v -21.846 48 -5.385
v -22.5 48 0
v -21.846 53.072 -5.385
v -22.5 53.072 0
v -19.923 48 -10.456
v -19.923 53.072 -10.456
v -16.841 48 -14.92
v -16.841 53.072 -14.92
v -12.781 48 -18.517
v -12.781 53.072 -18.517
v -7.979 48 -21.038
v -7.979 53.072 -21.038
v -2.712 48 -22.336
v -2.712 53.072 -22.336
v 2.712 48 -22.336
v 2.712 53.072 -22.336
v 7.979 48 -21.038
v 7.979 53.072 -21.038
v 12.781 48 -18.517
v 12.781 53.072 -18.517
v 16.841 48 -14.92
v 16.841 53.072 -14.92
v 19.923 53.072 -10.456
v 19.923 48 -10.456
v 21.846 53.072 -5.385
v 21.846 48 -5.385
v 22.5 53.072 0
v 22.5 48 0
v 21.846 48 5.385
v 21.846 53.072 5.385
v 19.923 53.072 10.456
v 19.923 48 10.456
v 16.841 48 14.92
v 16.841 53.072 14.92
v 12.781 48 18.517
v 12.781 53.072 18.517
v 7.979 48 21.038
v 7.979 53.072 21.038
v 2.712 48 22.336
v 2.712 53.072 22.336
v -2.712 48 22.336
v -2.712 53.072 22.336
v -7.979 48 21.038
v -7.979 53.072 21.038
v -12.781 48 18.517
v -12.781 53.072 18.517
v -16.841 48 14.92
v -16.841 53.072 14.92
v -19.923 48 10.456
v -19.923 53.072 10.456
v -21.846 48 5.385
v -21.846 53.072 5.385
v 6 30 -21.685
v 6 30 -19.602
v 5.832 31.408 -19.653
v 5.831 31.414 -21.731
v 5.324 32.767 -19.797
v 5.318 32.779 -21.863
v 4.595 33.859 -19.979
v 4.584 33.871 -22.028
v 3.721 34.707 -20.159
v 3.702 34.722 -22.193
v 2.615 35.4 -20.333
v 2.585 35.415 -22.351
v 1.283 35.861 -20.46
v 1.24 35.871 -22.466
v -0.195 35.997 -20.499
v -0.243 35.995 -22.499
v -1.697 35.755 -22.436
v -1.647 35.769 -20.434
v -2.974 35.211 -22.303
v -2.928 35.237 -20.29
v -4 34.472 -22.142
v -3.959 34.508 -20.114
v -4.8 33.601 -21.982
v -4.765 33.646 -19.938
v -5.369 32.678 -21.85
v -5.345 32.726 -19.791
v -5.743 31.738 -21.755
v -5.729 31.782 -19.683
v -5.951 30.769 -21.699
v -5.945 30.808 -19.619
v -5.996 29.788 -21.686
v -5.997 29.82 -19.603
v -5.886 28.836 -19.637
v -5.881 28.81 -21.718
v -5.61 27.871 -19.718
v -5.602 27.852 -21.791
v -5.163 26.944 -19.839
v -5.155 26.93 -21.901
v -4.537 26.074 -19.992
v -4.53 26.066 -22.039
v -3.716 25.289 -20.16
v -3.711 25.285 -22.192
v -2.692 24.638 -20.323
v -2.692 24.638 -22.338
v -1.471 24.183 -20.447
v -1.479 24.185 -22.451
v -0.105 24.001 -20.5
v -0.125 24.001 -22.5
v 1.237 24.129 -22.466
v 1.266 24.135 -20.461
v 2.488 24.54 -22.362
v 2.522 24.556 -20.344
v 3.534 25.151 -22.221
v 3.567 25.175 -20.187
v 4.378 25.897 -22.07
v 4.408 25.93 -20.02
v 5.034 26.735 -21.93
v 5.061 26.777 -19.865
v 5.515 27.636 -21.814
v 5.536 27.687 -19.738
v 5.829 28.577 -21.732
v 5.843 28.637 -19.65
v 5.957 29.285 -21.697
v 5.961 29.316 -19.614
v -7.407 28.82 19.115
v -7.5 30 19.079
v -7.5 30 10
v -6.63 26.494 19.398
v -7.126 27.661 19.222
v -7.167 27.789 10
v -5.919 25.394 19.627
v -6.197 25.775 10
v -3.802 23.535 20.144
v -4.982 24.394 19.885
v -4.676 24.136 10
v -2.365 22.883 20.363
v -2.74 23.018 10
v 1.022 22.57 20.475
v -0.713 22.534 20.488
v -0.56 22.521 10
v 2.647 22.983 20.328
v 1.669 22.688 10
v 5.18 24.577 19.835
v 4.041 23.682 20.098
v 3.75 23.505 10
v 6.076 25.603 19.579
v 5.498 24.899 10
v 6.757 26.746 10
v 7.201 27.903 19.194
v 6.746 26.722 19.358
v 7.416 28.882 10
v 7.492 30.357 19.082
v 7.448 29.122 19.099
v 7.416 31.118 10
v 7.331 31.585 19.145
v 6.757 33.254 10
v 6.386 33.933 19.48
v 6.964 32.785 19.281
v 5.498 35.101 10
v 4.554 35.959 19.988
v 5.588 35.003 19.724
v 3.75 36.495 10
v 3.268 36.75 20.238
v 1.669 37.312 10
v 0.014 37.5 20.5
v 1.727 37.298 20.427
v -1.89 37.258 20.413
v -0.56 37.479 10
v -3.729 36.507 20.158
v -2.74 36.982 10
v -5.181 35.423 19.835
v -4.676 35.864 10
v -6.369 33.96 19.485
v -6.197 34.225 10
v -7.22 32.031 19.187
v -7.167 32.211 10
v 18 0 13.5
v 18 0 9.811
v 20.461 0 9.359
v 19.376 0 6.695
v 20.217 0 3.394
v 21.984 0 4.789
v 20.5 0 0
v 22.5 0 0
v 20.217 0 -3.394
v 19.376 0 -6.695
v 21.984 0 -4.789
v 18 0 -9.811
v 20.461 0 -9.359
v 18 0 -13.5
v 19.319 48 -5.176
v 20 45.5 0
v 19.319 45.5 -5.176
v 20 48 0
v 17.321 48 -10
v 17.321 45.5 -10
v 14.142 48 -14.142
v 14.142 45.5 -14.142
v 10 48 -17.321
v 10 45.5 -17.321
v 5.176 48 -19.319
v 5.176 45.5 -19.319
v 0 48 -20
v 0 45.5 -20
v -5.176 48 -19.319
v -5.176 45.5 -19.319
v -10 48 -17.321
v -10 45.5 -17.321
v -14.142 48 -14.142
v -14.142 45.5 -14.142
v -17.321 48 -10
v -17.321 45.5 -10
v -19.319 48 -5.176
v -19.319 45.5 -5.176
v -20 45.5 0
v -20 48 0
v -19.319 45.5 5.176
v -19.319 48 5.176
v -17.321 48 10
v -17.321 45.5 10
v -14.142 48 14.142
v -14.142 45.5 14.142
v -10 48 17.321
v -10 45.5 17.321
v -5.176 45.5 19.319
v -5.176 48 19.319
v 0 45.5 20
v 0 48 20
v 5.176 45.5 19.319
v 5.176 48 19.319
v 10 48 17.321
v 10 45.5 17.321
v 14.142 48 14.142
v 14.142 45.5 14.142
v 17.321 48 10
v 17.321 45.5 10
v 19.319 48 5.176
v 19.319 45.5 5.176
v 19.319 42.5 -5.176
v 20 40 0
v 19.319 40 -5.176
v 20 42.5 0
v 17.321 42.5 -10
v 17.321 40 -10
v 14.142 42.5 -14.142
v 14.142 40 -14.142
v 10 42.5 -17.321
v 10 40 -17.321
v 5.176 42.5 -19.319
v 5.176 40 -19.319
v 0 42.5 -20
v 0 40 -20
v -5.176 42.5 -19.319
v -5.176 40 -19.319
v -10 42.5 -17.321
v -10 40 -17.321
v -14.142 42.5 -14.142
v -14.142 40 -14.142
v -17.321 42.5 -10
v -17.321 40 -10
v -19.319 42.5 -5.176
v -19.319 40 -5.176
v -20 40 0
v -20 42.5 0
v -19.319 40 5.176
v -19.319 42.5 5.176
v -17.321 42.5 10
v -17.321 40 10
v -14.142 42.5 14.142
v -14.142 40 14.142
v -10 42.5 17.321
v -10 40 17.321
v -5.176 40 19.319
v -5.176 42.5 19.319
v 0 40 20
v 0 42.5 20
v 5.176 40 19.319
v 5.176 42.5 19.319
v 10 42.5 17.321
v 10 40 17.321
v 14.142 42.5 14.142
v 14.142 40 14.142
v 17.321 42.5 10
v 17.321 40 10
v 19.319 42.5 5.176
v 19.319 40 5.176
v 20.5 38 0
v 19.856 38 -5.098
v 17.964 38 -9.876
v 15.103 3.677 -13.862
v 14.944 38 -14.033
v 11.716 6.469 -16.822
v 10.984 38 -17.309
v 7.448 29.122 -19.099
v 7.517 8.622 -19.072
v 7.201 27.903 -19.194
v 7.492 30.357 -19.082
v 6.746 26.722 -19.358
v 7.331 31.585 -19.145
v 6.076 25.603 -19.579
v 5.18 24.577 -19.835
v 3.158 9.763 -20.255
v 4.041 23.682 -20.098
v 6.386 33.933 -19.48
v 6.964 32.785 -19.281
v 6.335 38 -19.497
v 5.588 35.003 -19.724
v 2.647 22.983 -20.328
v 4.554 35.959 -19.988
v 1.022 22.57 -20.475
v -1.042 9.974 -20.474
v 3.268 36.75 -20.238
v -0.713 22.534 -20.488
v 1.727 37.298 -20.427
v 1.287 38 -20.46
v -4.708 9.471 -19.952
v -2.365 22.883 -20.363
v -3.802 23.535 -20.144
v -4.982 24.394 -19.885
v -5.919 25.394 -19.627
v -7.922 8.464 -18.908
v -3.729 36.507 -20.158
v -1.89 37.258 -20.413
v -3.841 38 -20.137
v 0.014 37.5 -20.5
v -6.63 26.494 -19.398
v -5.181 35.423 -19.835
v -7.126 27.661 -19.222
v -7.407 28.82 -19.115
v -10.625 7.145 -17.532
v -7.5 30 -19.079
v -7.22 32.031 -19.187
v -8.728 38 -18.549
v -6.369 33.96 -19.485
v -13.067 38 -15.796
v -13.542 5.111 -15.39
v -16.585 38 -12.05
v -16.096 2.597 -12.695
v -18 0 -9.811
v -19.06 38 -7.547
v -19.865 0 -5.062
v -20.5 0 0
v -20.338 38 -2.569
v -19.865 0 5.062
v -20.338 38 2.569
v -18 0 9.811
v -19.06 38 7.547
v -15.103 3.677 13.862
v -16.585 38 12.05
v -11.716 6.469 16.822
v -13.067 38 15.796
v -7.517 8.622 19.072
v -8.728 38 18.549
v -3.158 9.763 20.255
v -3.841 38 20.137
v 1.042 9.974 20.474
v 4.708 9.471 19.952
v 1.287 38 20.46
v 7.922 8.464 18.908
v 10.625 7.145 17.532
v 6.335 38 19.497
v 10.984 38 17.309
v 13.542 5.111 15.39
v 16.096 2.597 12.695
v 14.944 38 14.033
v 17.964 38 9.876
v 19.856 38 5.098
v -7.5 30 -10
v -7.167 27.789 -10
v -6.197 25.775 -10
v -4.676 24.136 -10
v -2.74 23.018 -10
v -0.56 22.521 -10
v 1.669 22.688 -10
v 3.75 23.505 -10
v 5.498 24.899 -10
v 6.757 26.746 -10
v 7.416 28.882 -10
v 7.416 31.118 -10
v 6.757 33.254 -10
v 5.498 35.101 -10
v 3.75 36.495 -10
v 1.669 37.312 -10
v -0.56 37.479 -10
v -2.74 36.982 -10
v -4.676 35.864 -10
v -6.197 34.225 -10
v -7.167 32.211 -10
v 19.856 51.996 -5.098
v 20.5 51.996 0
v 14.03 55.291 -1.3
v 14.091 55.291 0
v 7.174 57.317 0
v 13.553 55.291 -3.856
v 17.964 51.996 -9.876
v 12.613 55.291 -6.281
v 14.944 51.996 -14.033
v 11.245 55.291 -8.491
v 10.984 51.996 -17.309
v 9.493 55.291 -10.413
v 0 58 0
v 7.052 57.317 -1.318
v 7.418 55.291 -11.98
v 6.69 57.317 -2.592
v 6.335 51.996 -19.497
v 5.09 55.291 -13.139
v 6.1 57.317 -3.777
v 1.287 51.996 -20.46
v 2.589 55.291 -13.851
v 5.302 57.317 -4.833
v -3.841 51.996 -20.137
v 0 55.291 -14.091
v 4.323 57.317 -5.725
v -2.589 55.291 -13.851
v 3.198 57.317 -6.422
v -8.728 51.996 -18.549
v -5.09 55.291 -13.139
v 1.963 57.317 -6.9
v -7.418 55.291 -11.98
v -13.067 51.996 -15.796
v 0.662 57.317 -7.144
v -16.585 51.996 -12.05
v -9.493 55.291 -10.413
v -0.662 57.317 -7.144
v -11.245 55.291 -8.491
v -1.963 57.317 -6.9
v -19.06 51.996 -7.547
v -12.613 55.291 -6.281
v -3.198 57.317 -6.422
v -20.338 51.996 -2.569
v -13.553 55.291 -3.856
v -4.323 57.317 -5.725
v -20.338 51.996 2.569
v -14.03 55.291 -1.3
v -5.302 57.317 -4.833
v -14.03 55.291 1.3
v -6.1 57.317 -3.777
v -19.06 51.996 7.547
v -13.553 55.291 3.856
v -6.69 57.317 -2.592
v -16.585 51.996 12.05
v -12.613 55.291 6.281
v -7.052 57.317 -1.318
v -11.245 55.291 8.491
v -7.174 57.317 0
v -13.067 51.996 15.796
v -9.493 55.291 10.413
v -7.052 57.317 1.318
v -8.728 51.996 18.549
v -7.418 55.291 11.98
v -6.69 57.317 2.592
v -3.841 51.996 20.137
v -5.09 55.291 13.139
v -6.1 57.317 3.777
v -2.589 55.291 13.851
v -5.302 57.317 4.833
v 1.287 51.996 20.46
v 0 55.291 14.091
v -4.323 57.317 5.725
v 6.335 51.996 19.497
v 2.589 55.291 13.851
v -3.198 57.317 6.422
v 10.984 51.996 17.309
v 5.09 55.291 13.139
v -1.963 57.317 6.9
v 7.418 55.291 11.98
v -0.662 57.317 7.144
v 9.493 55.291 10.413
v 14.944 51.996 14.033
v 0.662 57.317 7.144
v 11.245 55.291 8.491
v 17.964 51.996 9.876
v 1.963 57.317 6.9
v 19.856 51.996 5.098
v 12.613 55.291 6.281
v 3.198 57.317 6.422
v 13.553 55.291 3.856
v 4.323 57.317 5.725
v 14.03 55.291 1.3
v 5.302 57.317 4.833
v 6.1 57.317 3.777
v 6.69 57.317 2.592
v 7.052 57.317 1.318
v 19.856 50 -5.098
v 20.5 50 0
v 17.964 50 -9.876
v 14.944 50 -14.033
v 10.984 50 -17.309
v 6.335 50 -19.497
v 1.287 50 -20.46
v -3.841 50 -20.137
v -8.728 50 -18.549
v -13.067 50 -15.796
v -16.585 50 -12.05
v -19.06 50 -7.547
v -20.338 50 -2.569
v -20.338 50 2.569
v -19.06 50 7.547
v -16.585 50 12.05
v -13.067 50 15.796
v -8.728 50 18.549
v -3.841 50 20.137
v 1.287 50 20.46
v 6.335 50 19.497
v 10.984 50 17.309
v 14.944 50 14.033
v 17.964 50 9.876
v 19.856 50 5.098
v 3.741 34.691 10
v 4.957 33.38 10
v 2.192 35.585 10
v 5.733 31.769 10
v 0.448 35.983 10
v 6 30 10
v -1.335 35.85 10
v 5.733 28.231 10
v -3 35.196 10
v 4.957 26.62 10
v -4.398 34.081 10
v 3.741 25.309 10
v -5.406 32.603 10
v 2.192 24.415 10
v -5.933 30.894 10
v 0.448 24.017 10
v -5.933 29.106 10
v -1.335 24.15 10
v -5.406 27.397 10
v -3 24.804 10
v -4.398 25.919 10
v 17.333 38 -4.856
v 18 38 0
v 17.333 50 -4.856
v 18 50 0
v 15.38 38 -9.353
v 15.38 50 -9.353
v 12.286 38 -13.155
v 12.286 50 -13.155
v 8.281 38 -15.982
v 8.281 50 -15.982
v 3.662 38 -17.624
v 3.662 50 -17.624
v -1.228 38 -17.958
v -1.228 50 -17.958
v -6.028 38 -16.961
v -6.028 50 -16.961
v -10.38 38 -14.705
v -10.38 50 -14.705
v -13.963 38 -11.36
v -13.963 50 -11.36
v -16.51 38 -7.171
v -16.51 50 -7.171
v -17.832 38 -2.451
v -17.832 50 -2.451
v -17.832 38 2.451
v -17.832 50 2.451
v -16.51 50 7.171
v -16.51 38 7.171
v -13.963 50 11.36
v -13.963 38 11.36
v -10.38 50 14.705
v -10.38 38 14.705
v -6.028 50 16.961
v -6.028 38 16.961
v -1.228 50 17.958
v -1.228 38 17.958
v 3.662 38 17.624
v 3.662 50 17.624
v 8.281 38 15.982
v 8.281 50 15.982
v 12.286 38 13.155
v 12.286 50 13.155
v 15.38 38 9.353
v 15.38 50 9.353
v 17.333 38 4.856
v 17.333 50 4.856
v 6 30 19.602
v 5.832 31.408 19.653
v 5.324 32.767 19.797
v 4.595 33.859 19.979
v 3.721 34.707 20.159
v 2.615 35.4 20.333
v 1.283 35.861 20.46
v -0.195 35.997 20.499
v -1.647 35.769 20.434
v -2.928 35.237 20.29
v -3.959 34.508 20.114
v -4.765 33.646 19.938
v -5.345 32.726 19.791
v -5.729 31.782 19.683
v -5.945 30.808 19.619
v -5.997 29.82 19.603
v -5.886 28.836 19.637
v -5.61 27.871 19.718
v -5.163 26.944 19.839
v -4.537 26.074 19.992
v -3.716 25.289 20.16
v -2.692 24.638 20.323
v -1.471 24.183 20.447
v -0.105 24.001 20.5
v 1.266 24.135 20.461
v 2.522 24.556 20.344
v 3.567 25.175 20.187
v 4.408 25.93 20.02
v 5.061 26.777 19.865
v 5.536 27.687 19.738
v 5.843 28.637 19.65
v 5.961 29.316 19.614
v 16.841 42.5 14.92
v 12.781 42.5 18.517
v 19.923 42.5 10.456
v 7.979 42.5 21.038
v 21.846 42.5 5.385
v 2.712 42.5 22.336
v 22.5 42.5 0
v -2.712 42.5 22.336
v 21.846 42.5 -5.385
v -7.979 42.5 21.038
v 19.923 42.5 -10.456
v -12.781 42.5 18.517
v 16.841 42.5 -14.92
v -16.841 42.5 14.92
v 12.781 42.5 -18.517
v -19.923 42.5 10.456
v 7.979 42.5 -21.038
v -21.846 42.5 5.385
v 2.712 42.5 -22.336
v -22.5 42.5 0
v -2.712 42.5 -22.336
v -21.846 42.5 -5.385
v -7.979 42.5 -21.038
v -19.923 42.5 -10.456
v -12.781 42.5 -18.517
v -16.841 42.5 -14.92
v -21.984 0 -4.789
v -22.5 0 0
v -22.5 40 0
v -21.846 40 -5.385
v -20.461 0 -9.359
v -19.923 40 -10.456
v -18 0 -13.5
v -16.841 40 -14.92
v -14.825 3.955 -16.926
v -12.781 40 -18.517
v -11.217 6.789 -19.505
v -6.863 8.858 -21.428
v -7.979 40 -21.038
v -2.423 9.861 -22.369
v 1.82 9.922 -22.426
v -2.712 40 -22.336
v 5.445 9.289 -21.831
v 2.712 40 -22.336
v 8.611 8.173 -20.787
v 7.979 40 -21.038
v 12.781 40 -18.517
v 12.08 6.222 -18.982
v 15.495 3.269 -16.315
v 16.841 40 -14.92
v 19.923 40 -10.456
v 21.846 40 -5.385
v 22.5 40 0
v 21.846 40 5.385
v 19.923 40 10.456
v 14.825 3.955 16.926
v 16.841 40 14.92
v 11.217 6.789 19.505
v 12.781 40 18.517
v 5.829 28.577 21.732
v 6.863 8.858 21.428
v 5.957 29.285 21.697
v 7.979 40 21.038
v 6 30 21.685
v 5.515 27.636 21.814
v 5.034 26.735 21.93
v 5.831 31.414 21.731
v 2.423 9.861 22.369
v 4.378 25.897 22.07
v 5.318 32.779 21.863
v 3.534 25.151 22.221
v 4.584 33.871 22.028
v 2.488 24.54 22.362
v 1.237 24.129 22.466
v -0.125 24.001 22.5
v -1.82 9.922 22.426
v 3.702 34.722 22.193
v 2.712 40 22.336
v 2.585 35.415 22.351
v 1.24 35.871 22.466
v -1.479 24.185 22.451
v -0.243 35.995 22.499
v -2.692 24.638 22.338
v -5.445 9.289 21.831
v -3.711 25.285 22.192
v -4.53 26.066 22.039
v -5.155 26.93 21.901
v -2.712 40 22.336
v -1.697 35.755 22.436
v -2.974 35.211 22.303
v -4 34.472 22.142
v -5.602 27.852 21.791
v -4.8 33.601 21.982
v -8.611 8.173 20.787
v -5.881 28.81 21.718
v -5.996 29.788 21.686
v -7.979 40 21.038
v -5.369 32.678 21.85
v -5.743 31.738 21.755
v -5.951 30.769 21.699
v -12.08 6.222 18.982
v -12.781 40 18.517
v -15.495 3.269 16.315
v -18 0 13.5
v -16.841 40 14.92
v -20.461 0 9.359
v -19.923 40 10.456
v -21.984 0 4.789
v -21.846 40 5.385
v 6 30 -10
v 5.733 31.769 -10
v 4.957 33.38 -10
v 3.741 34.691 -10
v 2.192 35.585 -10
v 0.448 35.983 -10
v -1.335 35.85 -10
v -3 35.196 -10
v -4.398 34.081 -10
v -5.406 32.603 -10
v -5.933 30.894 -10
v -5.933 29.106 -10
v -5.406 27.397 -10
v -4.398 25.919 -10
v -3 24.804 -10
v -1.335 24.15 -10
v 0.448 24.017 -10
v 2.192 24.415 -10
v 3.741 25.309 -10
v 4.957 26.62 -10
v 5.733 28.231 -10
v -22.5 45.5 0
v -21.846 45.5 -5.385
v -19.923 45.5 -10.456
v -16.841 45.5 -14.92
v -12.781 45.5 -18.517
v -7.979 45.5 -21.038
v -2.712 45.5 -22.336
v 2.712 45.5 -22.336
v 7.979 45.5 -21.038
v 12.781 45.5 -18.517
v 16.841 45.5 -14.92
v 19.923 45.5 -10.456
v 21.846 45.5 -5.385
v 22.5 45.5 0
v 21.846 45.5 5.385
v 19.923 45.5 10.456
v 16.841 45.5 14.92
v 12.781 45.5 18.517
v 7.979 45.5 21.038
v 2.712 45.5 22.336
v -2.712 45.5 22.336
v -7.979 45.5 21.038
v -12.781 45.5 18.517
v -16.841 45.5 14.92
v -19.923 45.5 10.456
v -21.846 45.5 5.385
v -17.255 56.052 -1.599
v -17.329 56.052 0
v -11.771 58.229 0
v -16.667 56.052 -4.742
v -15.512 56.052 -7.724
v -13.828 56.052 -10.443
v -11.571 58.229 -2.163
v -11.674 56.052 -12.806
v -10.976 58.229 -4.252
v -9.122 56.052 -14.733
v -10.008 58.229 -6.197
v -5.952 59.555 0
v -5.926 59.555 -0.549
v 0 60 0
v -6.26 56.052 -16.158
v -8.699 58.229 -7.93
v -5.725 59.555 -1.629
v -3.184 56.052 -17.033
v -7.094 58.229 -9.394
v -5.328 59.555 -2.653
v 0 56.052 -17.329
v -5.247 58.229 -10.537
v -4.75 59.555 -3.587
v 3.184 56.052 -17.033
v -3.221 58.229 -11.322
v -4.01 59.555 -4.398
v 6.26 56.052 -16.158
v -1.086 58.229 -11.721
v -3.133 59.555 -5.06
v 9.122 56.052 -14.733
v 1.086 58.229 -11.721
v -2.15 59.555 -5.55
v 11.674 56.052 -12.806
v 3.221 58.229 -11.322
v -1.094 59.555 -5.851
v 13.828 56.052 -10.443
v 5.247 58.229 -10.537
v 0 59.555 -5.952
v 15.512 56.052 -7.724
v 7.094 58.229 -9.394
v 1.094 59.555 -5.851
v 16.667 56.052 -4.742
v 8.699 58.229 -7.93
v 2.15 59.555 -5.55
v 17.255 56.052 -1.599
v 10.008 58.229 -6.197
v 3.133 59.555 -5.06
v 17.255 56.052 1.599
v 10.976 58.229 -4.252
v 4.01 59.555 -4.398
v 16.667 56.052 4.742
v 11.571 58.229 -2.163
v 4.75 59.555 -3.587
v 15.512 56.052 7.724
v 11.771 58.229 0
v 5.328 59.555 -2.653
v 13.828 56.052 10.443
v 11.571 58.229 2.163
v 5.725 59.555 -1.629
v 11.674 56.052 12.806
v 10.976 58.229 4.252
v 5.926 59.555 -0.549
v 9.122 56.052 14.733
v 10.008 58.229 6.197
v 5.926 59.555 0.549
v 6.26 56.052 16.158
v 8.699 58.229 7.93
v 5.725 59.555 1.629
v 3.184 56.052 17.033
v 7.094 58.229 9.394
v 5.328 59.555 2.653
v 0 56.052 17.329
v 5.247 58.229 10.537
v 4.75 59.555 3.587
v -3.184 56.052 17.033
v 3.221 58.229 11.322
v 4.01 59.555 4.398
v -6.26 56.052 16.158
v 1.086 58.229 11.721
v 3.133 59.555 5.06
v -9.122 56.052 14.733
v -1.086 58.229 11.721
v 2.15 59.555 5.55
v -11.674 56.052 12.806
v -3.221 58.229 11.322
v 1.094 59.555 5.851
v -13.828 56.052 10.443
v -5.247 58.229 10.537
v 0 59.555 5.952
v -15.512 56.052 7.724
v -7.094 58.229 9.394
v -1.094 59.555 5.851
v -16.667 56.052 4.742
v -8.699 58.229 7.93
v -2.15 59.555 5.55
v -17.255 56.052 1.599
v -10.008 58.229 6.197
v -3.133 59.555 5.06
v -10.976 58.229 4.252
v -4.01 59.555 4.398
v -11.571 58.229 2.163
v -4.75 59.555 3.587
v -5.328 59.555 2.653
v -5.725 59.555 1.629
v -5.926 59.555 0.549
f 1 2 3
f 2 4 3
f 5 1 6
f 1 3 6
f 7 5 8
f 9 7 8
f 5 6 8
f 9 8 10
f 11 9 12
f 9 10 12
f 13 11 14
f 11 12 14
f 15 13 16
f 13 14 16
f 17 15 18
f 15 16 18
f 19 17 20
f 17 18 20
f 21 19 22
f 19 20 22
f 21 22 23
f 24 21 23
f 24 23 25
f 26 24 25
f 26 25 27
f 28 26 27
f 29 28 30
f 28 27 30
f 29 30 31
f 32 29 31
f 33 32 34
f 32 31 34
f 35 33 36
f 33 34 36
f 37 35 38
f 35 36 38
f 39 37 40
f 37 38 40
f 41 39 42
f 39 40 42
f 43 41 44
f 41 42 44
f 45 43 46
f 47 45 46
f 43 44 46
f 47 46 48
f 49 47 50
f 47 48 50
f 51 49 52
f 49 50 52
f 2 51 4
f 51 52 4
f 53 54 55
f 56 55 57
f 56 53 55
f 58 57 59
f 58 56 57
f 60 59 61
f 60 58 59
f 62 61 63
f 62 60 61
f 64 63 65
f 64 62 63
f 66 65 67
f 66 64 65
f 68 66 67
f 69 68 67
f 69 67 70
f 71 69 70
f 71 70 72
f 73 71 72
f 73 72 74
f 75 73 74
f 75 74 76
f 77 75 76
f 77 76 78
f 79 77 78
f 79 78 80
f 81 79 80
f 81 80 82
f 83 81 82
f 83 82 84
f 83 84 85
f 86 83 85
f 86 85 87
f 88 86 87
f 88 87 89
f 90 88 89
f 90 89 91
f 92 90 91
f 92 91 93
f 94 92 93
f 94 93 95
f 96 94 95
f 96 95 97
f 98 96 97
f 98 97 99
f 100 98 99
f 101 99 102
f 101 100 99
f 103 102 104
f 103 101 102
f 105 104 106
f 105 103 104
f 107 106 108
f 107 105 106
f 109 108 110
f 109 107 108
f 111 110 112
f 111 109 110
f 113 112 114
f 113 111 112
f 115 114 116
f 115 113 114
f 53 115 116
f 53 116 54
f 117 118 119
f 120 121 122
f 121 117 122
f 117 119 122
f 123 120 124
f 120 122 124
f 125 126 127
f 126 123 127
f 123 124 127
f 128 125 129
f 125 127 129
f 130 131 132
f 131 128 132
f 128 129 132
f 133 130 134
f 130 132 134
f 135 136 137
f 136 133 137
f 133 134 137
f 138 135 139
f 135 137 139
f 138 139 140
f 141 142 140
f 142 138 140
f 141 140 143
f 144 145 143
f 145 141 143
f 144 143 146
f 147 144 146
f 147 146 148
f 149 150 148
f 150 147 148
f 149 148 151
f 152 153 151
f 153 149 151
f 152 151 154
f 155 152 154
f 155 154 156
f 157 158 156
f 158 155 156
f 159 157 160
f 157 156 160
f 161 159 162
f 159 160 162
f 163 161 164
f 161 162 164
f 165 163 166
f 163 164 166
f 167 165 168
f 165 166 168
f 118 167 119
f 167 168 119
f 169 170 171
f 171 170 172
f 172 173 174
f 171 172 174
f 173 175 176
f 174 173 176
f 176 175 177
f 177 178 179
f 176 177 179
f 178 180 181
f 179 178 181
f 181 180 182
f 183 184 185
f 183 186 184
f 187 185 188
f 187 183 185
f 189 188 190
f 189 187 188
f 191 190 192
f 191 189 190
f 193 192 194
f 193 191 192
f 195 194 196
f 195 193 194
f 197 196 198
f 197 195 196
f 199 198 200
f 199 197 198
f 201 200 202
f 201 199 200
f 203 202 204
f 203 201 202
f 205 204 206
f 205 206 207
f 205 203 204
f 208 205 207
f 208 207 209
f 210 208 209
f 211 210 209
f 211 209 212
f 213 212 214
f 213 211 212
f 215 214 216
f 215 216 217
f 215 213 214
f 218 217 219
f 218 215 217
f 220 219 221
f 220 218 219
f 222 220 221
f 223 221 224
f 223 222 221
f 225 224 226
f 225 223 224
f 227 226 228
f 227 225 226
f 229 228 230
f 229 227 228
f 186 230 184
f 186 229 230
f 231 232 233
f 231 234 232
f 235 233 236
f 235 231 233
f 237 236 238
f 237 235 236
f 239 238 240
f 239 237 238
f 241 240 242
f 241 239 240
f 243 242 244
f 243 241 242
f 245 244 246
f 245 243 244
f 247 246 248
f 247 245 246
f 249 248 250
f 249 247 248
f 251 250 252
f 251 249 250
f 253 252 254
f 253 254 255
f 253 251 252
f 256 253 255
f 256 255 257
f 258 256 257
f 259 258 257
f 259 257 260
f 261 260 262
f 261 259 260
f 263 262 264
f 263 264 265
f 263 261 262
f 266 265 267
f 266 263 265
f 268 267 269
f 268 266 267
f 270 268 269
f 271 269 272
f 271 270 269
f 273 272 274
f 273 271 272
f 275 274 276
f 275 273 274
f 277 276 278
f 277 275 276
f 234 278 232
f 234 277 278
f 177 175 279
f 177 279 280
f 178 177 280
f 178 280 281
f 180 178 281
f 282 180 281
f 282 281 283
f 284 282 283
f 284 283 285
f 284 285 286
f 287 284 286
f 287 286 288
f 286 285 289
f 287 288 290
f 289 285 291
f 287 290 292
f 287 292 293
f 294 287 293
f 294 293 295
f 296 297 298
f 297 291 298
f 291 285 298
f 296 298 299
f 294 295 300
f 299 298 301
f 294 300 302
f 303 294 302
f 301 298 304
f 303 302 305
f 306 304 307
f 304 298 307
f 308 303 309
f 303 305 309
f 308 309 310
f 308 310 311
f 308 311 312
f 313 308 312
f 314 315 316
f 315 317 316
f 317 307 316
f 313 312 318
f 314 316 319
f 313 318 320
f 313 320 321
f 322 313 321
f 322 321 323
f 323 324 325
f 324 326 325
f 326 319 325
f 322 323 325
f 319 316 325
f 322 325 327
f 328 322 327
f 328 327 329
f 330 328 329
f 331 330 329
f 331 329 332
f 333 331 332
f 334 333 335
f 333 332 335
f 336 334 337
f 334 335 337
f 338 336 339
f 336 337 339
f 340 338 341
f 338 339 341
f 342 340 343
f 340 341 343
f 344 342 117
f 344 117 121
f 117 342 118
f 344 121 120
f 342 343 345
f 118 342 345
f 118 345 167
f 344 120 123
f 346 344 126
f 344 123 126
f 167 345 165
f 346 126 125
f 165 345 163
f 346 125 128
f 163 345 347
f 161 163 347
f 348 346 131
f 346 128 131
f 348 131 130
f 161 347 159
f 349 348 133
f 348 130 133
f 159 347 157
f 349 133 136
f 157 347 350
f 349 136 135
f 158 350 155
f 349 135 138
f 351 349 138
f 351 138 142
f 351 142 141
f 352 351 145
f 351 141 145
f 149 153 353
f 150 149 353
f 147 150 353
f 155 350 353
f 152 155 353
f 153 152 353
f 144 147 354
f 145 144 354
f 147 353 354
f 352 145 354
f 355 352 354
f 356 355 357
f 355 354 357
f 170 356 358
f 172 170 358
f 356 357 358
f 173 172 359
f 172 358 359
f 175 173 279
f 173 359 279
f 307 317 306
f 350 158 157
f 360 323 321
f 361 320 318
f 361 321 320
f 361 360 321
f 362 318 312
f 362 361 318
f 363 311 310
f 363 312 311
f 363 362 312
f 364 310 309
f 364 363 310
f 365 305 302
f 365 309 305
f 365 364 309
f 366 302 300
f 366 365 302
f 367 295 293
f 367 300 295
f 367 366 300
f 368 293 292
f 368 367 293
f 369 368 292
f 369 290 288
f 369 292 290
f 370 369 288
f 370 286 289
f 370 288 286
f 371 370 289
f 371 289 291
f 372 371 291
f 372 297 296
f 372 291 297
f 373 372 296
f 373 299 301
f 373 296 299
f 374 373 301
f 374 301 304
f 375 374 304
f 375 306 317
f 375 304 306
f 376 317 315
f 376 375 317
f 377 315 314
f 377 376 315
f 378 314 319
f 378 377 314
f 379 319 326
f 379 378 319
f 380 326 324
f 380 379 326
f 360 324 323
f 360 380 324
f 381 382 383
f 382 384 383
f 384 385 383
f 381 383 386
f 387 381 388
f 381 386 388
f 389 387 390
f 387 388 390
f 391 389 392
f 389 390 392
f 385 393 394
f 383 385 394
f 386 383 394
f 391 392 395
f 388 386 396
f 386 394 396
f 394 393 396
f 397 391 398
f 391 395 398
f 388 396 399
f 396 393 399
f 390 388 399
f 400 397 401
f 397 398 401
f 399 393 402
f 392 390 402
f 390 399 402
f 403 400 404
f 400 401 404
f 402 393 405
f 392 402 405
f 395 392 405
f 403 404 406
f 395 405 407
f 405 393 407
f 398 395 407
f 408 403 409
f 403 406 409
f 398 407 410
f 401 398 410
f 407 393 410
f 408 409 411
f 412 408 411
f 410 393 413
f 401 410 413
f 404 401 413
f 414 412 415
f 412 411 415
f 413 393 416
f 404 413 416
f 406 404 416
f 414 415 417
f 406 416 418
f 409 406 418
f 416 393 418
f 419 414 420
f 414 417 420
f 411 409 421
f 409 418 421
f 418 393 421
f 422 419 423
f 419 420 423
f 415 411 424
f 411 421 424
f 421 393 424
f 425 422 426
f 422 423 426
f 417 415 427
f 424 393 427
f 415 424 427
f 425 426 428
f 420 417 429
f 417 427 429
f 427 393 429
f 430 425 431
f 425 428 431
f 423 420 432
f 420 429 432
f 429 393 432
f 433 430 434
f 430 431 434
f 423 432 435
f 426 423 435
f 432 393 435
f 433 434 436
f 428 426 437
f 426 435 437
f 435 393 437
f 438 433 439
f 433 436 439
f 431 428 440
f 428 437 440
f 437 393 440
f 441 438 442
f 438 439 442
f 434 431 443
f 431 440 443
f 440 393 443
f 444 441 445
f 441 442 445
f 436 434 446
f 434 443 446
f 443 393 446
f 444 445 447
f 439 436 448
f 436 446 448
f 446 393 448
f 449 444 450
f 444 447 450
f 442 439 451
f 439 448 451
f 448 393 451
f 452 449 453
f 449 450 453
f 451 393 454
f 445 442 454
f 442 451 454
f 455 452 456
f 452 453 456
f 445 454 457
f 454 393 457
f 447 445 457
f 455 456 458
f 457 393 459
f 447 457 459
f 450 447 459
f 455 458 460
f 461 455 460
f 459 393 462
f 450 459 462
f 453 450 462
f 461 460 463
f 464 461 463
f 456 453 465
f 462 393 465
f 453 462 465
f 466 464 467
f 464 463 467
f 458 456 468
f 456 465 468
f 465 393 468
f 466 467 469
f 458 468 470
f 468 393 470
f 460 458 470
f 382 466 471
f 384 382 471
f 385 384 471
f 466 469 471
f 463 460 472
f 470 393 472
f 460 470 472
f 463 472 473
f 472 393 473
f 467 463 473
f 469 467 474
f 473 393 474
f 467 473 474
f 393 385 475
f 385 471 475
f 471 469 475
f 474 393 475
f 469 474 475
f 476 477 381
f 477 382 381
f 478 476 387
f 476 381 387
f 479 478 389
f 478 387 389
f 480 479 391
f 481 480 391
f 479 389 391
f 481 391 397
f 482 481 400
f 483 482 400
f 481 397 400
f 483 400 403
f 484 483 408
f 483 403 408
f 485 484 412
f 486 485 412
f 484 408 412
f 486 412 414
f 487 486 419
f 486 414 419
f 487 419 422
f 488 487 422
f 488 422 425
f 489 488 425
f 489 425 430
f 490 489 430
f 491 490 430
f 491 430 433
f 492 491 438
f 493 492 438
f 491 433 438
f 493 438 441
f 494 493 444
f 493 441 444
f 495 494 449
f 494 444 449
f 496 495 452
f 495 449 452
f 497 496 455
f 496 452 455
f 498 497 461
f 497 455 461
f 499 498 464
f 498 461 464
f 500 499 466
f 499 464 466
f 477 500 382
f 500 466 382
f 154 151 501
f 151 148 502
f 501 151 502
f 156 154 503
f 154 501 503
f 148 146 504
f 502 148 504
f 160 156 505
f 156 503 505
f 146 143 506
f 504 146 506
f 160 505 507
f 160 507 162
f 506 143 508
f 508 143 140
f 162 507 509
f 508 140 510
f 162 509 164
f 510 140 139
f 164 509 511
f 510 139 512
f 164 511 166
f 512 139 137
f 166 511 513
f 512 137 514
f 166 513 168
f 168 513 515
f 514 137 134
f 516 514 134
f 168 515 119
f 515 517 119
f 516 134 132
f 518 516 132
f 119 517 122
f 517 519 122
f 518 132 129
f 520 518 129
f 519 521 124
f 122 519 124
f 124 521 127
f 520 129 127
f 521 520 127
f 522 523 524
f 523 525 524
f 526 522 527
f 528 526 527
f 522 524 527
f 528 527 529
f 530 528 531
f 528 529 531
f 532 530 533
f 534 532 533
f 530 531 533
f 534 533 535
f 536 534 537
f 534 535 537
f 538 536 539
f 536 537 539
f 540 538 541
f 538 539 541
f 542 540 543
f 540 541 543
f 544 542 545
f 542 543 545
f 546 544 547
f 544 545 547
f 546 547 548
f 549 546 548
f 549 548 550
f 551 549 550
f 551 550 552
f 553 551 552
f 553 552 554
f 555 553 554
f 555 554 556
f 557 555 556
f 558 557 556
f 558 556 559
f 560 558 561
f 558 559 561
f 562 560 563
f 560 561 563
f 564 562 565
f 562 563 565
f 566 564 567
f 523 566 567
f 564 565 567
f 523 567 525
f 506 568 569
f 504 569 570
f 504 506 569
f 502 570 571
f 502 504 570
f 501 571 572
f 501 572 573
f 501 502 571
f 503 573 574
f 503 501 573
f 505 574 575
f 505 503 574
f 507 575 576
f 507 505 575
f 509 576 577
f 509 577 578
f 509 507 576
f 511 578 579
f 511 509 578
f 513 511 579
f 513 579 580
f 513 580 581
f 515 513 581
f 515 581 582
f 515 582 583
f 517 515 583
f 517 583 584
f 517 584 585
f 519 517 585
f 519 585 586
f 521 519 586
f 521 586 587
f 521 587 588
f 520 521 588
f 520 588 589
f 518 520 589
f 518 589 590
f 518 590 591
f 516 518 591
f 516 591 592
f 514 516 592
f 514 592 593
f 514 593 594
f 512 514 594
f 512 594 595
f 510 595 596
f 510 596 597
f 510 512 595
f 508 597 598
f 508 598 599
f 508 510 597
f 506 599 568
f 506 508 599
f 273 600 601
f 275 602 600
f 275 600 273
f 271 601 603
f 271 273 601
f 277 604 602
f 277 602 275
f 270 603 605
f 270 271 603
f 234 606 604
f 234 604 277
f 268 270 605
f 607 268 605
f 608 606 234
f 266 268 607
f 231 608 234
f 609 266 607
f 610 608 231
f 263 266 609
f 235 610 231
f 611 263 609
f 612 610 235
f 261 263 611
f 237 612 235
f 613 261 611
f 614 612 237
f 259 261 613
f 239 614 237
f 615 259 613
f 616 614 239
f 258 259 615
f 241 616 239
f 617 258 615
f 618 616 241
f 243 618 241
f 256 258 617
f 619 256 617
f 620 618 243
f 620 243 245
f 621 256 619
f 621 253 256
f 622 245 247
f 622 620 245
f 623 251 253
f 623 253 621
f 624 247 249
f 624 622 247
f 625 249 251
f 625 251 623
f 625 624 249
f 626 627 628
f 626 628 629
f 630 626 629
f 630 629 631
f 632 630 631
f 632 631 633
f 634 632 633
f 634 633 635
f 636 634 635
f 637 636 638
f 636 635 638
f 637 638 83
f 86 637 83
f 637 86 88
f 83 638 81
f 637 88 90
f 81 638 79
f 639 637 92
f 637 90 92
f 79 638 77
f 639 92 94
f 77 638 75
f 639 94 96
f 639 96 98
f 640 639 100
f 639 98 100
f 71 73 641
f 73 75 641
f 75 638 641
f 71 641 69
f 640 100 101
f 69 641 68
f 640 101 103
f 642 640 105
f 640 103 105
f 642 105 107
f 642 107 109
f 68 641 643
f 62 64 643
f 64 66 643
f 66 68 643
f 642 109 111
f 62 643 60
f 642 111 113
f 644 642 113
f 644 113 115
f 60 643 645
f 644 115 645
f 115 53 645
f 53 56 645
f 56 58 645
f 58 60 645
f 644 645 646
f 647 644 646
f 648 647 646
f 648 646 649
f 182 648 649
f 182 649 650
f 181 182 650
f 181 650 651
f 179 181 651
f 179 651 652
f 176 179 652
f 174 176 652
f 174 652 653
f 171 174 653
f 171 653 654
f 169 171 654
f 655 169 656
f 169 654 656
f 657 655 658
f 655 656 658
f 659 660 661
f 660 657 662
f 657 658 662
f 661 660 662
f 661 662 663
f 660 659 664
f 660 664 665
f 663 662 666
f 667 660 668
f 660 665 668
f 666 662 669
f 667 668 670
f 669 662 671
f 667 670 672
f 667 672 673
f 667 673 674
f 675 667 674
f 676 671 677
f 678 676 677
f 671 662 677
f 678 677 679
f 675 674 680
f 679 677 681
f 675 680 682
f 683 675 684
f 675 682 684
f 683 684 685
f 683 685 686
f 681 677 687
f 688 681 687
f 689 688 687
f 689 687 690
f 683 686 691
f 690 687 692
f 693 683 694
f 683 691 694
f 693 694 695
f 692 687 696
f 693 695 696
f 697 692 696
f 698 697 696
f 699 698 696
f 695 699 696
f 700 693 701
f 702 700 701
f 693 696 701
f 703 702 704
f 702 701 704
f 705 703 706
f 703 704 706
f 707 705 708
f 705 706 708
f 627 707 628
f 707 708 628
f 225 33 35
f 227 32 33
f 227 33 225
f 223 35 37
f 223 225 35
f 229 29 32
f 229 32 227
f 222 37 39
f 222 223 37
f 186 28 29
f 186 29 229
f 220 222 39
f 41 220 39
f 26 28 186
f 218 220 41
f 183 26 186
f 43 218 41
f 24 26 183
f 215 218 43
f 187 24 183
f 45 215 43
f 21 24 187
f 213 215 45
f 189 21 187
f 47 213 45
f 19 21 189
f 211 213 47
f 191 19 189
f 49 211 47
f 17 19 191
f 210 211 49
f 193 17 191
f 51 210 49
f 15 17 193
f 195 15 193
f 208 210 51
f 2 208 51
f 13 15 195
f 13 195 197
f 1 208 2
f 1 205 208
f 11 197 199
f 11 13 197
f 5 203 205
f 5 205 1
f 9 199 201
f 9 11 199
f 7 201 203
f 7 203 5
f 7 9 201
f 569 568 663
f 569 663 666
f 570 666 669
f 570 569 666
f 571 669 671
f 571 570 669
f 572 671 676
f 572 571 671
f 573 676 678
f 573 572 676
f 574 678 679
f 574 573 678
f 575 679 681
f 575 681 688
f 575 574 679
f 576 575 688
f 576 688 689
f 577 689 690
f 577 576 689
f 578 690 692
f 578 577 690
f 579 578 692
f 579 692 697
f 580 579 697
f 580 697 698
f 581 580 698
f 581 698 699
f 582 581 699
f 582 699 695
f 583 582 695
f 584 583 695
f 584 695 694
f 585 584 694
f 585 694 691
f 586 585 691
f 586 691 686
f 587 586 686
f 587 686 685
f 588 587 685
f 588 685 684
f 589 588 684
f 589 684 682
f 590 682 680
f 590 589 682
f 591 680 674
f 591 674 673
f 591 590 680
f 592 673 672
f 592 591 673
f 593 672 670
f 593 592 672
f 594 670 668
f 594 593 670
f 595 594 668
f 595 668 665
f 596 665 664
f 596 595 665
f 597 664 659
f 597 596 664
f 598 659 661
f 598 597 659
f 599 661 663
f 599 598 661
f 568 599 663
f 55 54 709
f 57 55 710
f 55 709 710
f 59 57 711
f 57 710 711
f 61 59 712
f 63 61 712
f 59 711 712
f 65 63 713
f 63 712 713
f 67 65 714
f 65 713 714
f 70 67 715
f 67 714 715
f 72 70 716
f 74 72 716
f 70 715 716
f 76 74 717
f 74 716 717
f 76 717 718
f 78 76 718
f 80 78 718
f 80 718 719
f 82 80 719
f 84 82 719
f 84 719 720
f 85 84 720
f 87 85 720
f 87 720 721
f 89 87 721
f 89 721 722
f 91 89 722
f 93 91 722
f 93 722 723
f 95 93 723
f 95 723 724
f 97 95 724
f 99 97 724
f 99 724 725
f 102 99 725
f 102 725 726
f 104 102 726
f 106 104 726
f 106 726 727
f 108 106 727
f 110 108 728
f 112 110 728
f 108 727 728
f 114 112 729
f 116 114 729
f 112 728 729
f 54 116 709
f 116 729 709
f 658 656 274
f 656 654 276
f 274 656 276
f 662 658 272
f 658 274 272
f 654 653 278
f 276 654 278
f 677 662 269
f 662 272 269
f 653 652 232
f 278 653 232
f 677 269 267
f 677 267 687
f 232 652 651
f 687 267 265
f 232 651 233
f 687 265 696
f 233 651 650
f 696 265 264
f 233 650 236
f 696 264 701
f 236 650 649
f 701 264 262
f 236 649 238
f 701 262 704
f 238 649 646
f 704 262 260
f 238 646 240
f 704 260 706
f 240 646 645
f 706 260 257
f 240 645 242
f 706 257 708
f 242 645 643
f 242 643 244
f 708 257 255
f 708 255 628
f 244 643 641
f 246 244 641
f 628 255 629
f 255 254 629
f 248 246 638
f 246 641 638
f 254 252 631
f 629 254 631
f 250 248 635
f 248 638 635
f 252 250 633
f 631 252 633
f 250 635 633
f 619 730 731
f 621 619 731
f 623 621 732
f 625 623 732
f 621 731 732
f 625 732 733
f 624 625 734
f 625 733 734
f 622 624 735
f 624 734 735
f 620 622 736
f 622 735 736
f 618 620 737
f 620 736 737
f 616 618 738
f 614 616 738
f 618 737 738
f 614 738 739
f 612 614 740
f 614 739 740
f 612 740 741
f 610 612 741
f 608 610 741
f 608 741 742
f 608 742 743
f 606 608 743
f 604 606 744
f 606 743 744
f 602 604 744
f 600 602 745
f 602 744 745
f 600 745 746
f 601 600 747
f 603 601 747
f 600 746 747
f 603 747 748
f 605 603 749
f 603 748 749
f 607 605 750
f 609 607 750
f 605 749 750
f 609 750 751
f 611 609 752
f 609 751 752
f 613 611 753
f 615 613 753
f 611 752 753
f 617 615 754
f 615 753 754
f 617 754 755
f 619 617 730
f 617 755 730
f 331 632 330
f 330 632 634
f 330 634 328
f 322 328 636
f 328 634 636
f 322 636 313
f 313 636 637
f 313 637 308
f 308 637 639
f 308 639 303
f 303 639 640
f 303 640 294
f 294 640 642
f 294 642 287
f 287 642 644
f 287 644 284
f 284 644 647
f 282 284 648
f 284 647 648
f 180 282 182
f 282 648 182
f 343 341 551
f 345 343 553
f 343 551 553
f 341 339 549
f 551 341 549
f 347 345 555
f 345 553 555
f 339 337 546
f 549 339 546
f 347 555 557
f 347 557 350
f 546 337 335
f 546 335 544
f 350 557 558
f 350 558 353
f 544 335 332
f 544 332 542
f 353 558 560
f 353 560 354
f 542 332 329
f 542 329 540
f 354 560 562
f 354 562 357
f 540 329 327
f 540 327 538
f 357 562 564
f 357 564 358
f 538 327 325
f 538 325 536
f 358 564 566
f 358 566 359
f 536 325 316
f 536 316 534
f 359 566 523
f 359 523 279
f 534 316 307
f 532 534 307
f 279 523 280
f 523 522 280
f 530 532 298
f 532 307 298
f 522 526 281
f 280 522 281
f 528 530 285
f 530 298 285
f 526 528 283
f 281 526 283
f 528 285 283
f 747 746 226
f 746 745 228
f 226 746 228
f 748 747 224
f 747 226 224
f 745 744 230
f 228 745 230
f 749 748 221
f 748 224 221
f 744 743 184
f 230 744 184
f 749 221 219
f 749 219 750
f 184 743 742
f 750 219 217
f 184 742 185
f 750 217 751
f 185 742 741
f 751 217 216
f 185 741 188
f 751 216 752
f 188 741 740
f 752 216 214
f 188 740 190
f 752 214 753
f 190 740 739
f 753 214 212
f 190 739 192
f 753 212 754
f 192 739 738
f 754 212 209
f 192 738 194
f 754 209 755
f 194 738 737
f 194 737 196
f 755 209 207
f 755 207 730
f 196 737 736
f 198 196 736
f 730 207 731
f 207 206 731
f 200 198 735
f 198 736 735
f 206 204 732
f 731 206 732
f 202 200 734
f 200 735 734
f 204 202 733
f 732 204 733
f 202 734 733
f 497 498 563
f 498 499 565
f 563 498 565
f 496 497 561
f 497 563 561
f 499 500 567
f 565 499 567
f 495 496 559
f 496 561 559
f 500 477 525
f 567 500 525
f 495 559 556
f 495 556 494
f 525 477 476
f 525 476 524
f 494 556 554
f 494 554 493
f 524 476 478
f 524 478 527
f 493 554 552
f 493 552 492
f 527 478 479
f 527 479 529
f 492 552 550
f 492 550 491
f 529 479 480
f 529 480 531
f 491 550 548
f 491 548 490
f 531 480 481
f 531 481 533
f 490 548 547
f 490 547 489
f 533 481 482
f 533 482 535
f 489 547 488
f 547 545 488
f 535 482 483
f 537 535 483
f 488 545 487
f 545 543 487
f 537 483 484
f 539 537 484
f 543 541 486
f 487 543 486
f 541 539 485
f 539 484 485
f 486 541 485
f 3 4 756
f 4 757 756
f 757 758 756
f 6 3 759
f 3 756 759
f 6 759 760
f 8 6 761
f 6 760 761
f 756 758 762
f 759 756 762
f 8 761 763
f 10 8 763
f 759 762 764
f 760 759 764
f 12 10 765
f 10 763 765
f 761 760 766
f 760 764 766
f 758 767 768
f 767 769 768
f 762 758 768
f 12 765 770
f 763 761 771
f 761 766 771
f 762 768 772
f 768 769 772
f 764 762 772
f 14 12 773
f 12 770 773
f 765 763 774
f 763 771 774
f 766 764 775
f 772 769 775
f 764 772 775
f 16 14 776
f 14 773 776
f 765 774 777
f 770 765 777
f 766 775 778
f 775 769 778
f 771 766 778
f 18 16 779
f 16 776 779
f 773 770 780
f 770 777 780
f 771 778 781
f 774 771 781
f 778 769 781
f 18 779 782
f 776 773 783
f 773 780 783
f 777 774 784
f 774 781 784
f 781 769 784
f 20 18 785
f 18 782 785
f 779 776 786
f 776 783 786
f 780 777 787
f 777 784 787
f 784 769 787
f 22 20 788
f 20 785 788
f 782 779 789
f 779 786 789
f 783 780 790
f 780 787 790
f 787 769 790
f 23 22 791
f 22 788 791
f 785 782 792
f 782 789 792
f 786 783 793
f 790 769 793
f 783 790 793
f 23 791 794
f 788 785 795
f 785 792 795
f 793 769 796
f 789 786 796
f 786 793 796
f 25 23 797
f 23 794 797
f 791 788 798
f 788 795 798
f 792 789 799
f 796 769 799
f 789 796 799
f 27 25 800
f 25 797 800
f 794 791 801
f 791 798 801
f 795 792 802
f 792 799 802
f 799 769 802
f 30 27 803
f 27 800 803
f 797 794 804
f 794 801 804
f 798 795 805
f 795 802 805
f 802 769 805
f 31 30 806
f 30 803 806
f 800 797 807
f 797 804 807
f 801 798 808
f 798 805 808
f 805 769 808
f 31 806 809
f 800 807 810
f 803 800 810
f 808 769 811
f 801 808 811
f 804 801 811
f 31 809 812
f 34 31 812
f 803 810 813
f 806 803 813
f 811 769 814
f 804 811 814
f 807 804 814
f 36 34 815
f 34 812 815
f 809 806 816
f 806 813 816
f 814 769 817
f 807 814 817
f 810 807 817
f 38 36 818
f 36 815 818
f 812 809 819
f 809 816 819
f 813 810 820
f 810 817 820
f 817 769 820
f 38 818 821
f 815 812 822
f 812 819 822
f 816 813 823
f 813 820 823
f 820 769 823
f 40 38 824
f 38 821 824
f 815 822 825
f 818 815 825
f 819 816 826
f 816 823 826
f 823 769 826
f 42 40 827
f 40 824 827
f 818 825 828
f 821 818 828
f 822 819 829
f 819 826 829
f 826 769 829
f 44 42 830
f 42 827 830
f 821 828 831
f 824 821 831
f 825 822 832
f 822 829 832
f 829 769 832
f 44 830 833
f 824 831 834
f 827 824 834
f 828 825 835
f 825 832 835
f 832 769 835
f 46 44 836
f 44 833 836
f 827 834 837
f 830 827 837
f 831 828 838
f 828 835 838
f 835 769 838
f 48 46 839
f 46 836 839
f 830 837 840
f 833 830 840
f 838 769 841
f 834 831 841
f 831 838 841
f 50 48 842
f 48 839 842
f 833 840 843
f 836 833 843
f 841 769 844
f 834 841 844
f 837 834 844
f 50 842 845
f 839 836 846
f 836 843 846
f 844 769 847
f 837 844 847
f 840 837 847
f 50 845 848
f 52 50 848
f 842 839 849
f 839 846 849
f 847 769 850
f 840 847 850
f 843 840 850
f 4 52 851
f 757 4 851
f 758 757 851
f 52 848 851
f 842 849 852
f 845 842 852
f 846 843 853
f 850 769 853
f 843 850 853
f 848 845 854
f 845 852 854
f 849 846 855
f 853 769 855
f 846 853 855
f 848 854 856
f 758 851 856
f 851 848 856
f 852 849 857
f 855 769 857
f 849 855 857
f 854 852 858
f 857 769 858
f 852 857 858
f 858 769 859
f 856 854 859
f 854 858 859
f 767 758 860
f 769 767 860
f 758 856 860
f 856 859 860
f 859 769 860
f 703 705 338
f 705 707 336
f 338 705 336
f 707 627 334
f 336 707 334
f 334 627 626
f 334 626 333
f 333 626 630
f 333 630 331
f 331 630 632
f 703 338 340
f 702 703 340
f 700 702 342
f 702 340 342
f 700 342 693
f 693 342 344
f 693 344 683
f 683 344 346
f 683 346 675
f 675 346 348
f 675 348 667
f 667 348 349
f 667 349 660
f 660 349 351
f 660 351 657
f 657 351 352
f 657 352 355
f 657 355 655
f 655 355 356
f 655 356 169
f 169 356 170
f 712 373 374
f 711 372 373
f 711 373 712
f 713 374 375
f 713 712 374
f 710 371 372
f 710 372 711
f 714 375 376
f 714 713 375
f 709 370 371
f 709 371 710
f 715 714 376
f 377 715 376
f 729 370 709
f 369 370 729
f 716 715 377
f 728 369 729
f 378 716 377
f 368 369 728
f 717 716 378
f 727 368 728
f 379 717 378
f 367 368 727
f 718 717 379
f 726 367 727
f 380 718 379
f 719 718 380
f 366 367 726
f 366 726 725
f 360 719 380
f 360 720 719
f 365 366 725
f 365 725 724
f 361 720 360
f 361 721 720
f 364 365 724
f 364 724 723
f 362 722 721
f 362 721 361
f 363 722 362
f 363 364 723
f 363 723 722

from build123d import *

# Parameters (mm, degrees)
SZKIC2_W                         = 2.5
SZKIC2_H                         = 2.5
SZYK_LINIOWY1_COUNT              = 2
SZYK_LINIOWY1_PITCH              = 5.5
WYTNIJ_WYCI_GNI_CIE1_DEPTH       = 68.915388536
WYTNIJ_WYCI_GNI_CIE1_DEPTH_BACK  = 68.915388536
WYTNIJ_WYCI_GNI_CIE2_DEPTH       = 68.915388602
WYTNIJ_WYCI_GNI_CIE2_DEPTH_BACK  = 68.915388602
SZKIC4_R                         = 6
DODANIE_WYCI_GNI_CIE1_REACH      = 79.915
DODANIE_WYCI_GNI_CIE1_END_RADIUS = 20.5
DODANIE_WYCI_GNI_CIE1_START      = 10
SZKIC5_R                         = 7.5
SZKIC5_R_2                       = 6


# Read off the part's stored shape, not the designer's step: Skorupa1
with BuildPart() as part:
    # Szkic1 → Obrót1 (revolve)
    with BuildSketch(Plane.XY, mode=Mode.PRIVATE) as obr_t1_sk:
        with BuildLine():
            Line((0, 0), (22.5, 0))
            Line((22.5, 0), (22.5, 53.071891388))
            ThreePointArc((22.5, 53.071891388), (11.771243445, 58.228756555), (0, 60))
            Line((0, 60), (0, 0))
        make_face()
    revolve(obr_t1_sk.sketch.rotate(Axis((0, 60, 0), (0, -1, 0)), 180), axis=Axis((0, 60, 0), (0, -1, 0)))

    # Szkic2 → Wycięcie-obrót1 (revolve, cut)
    with BuildSketch(Plane.XY):
        with Locations((21.25, 41.25)):
            Rectangle(SZKIC2_W, SZKIC2_H)
    wyci_cie_obr_t1 = revolve(axis=Axis((0, 43.732823124, 0), (0, 1, 0)), mode=Mode.SUBTRACT)

    # Szyk liniowy1: Wycięcie-obrót1 ×2
    with Locations(*[(0, i * SZYK_LINIOWY1_PITCH, 0) for i in range(1, SZYK_LINIOWY1_COUNT)]):
        add(wyci_cie_obr_t1, mode=Mode.SUBTRACT)

    # Skorupa1 outline → Skorupa1 (revolve, cut)
    with BuildSketch(Plane.XY):
        with BuildLine():
            Line((20.5, 0), (20.5, 38))
            Line((20.5, 38), (18, 38))
            Line((18, 38), (18, 50))
            Line((18, 50), (20.5, 50))
            Line((20.5, 50), (20.500000011, 51.996093505))
            ThreePointArc((20.500000011, 51.996093505), (10.680553516, 56.468147425), (0, 58))
            Line((0, 58), (0, 0))
            Line((0, 0), (20.5, 0))
        make_face()
    revolve(axis=Axis((0, 0, 0), (0, 1, 0)), mode=Mode.SUBTRACT)

    # Szkic3 → Wytnij-wyciągnięcie1 (cut, two sides: drawn at the far end of the back side and taken through both)
    with BuildSketch(Plane.XY.offset(-WYTNIJ_WYCI_GNI_CIE1_DEPTH_BACK)):
        with BuildLine():
            Line((-99.770112831, -131.416252764), (-18, 0))
            ThreePointArc((-18, 0), (0, 10), (18, 0))
            Line((18, 0), (99.770112831, -131.416252764))
            Line((99.770112831, -131.416252764), (99.770112831, -440.974537052))
            Line((99.770112831, -440.974537052), (-99.770112831, -440.974537052))
            Line((-99.770112831, -440.974537052), (-99.770112831, -131.416252764))
        make_face()
    extrude(amount=WYTNIJ_WYCI_GNI_CIE1_DEPTH + WYTNIJ_WYCI_GNI_CIE1_DEPTH_BACK, mode=Mode.SUBTRACT)

    # Szkic4 → Wytnij-wyciągnięcie2 (cut, two sides: drawn at the far end of the back side and taken through both)
    with BuildSketch(Plane.XY.offset(-WYTNIJ_WYCI_GNI_CIE2_DEPTH_BACK)):
        with Locations((0, 30)):
            Circle(SZKIC4_R)
    extrude(amount=WYTNIJ_WYCI_GNI_CIE2_DEPTH + WYTNIJ_WYCI_GNI_CIE2_DEPTH_BACK, mode=Mode.SUBTRACT)

    # Dodanie-wyciągnięcie1: up to this cylinder (the profile starts inside it)
    dodanie_wyci_gni_cie1_end = Plane(origin=(0, 30, 0), z_dir=(0, 1, 0)) * Cylinder(DODANIE_WYCI_GNI_CIE1_END_RADIUS, 201.83, mode=Mode.PRIVATE)
    # Szkic5 → Dodanie-wyciągnięcie1 (add, up to the surface)
    with BuildSketch(Plane.XY.offset(DODANIE_WYCI_GNI_CIE1_START), mode=Mode.PRIVATE) as dodanie_wyci_gni_cie1_sk1:
        with Locations(Location((0, 30, 0), (0, 0, 180))):
            Circle(SZKIC5_R)
        with Locations((0, 30)):
            Circle(SZKIC5_R_2, mode=Mode.SUBTRACT)
    dodanie_wyci_gni_cie1_tool1 = extrude(dodanie_wyci_gni_cie1_sk1.sketch, amount=DODANIE_WYCI_GNI_CIE1_REACH, mode=Mode.PRIVATE) & dodanie_wyci_gni_cie1_end
    dodanie_wyci_gni_cie1 = dodanie_wyci_gni_cie1_tool1.solids().sort_by_distance((7.287868, 30, 10))[0]
    add(dodanie_wyci_gni_cie1)

    # Lustro1: Dodanie-wyciągnięcie1 across plane
    add(dodanie_wyci_gni_cie1.mirror(Plane.XY))


solid = part.part
